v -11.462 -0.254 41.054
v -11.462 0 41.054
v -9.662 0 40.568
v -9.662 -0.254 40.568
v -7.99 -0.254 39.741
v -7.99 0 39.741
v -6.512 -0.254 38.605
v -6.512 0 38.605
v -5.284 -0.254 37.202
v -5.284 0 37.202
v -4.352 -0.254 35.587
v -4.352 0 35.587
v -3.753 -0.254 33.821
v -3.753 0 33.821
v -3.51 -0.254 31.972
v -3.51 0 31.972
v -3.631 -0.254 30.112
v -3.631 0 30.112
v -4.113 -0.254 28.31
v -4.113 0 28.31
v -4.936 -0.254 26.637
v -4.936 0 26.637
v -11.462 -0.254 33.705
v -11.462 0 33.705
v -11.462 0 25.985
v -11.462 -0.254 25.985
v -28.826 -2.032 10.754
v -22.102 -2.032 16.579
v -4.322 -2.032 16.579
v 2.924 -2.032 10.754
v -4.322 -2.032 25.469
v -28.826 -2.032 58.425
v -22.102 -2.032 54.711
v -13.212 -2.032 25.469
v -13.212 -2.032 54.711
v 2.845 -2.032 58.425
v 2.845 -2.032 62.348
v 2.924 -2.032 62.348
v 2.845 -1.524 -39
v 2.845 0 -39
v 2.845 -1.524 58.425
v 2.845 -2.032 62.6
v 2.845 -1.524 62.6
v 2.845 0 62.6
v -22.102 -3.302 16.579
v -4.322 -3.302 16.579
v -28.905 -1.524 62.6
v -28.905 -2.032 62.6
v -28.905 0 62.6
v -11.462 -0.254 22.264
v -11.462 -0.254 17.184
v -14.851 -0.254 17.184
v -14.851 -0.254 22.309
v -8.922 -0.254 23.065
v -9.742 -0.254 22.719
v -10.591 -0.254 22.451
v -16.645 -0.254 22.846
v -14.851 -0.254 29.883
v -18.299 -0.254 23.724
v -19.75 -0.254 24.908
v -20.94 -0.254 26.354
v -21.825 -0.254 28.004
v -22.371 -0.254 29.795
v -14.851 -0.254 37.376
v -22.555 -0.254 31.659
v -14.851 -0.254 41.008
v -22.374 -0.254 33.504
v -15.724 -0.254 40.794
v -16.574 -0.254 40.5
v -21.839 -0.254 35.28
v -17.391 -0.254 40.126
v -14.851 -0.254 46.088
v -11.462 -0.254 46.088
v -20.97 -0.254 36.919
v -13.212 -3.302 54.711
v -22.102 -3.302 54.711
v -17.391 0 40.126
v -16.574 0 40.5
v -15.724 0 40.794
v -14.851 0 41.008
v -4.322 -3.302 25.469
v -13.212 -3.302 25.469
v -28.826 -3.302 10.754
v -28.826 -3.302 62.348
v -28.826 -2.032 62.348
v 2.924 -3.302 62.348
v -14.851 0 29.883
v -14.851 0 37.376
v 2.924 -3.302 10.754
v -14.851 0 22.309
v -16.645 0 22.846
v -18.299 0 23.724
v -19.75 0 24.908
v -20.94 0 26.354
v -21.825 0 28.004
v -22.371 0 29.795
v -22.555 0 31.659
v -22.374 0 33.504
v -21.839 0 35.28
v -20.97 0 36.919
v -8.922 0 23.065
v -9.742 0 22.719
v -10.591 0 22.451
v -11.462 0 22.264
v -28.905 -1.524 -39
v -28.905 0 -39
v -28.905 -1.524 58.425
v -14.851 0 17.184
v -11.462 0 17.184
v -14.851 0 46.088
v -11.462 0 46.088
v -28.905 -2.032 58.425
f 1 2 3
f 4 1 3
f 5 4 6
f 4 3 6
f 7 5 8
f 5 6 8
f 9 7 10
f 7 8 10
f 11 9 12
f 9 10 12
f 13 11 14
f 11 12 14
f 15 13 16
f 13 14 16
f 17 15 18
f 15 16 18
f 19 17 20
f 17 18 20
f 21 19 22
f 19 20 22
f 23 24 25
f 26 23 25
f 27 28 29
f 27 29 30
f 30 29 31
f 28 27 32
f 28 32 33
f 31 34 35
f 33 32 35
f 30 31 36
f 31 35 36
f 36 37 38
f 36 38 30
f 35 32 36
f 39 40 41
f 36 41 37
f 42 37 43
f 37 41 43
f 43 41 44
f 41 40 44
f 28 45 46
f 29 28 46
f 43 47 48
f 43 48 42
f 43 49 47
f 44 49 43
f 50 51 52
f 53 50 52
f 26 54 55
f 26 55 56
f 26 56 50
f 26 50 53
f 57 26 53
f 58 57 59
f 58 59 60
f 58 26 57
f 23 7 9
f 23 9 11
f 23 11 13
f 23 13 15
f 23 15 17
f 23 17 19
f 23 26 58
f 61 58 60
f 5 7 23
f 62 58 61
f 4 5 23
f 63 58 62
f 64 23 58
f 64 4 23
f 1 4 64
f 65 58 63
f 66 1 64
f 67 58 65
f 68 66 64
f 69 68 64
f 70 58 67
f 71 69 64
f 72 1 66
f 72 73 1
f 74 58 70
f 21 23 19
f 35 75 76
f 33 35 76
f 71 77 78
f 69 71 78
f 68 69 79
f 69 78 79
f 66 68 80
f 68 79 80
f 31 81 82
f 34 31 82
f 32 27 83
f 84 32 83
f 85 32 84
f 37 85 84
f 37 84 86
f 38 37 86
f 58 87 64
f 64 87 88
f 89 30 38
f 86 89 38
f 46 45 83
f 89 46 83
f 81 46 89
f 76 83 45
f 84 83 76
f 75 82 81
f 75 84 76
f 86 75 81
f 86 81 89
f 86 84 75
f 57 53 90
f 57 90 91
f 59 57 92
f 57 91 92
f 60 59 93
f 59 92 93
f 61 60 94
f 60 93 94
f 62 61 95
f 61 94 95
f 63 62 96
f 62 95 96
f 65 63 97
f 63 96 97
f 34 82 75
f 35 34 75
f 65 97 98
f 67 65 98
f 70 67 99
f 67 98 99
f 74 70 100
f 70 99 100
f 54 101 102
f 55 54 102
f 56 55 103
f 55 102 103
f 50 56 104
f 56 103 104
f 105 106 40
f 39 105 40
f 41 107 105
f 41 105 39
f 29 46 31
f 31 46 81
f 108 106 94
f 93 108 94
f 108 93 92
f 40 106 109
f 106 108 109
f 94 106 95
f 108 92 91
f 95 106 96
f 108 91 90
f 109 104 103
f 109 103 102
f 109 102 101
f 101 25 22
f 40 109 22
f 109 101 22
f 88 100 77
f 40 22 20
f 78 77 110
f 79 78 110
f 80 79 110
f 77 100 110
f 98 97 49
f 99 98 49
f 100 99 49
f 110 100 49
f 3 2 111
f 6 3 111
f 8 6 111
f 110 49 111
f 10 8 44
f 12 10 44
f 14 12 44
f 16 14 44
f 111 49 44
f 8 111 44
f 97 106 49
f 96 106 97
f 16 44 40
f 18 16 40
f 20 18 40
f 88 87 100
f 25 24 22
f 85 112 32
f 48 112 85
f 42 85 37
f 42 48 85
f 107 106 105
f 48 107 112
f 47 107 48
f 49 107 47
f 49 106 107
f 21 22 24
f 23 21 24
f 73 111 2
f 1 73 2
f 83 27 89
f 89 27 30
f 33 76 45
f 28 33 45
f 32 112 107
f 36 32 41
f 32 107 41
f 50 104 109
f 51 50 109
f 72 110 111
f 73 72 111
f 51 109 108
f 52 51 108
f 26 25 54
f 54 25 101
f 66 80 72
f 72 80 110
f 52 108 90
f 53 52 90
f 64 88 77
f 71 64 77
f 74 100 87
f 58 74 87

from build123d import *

# Parameters (mm, degrees)
F0_W      = 31.75
F0_H      = 101.6
F1_DEPTH  = 1.524
F2_W      = 31.75
F2_H      = 4.1754661679
F3_DEPTH  = 0.508
F5_W      = 31.75
F5_H      = 51.593744238
F6_DEPTH  = 1.27
F8_DEPTH  = 1.27
F10_DEPTH = 0.254
F12_DEPTH = 0.254


with BuildPart() as f1:
    # F0 (on Front) → F1 (new body)
    with BuildSketch(Plane.XZ):
        with Locations((-13.0295728195, 11.8000358343)):
            Rectangle(F0_W, F0_H)
    extrude(amount=F1_DEPTH)

    # F2 (on face) → F3 (join)
    with BuildSketch(Plane.XZ.offset(1.524)):
        with Locations((-13.0295728195, 60.5123027503)):
            Rectangle(F2_W, F2_H)
    extrude(amount=F3_DEPTH)

    # F5 (on offset) → F6 (join)
    with BuildSketch(Plane.XZ.offset(2.032)):
        with Locations((-12.9512589192, 36.5513293073)):
            Rectangle(F5_W, F5_H)
    extrude(amount=F6_DEPTH)

    # F7 (on face) → F8 (cut)
    with BuildSketch(Plane.XZ.offset(3.302)):
        Polygon((-13.2123797666, 54.7112040222), (-22.1023797666, 54.7112040222), (-22.1023797666, 16.5791511536), (-4.3223797666, 16.5791511536), (-4.3223797666, 25.4691511536), (-13.2123797666, 25.4691511536), align=None)
    extrude(amount=-F8_DEPTH, mode=Mode.SUBTRACT)

    # F9 (on face) → F10 (cut)
    with BuildSketch(Plane(origin=(0, 0, 0), x_dir=(-1, 0, 0), z_dir=(0, 1, 0))):
        with BuildLine():
            Line((4.9357393071, 26.6371323704), (17.3911272623, 40.1263655171))
            ThreePointArc((17.3911272623, 40.1263655171), (6.031549564, 38.1203135447), (4.9357393071, 26.6371323704))
        make_face()
        with BuildLine():
            ThreePointArc((8.9218471858, 23.0649033911), (18.1089201368, 23.6009763334), (22.5545728195, 31.6586345434))
            ThreePointArc((22.5545728195, 31.6586345434), (22.1499463329, 34.405343843), (20.9704443205, 36.9186901328))
            Line((20.9704443205, 36.9186901328), (8.9218471858, 23.0649033911))
        make_face()
    extrude(amount=-F10_DEPTH, mode=Mode.SUBTRACT)

    # F11 (on face) → F12 (cut)
    with BuildSketch(Plane(origin=(0, 0, 0), x_dir=(-1, 0, 0), z_dir=(0, 1, 0))):
        with BuildLine():
            Line((14.8511272623, 46.0878358148), (11.4618471858, 46.0878358148))
            Line((11.4618471858, 46.0878358148), (11.4618471858, 41.0537322724))
            ThreePointArc((11.4618471858, 41.0537322724), (13.1585452479, 41.1827613335), (14.8511272623, 41.0078358148))
            Line((14.8511272623, 41.0078358148), (14.8511272623, 46.0878358148))
        make_face()
        Polygon((14.8511272623, 37.3755357304), (11.4618471858, 33.7049323485), (11.4618471858, 25.9854606917), (14.8511272623, 29.8825420583), align=None)
        with BuildLine():
            ThreePointArc((14.8511272623, 41.0078358148), (13.1585452479, 41.1827613335), (11.4618471858, 41.0537322724))
            Line((11.4618471858, 41.0537322724), (11.4618471858, 33.7049323485))
            Line((11.4618471858, 33.7049323485), (14.8511272623, 37.3755357304))
            Line((14.8511272623, 37.3755357304), (14.8511272623, 41.0078358148))
        make_face()
        with BuildLine():
            Line((14.8511272623, 29.8825420583), (11.4618471858, 25.9854606917))
            Line((11.4618471858, 25.9854606917), (11.4618471858, 22.2635368144))
            ThreePointArc((11.4618471858, 22.2635368144), (13.1585452479, 22.1345077534), (14.8511272623, 22.3094332721))
            Line((14.8511272623, 22.3094332721), (14.8511272623, 29.8825420583))
        make_face()
        with BuildLine():
            ThreePointArc((14.8511272623, 22.3094332721), (13.1585452479, 22.1345077534), (11.4618471858, 22.2635368144))
            Line((11.4618471858, 22.2635368144), (11.4618471858, 17.1835368144))
            Line((11.4618471858, 17.1835368144), (14.8511272623, 17.1835368144))
            Line((14.8511272623, 17.1835368144), (14.8511272623, 22.3094332721))
        make_face()
    extrude(amount=-F12_DEPTH, mode=Mode.SUBTRACT)


solid = f1.part
